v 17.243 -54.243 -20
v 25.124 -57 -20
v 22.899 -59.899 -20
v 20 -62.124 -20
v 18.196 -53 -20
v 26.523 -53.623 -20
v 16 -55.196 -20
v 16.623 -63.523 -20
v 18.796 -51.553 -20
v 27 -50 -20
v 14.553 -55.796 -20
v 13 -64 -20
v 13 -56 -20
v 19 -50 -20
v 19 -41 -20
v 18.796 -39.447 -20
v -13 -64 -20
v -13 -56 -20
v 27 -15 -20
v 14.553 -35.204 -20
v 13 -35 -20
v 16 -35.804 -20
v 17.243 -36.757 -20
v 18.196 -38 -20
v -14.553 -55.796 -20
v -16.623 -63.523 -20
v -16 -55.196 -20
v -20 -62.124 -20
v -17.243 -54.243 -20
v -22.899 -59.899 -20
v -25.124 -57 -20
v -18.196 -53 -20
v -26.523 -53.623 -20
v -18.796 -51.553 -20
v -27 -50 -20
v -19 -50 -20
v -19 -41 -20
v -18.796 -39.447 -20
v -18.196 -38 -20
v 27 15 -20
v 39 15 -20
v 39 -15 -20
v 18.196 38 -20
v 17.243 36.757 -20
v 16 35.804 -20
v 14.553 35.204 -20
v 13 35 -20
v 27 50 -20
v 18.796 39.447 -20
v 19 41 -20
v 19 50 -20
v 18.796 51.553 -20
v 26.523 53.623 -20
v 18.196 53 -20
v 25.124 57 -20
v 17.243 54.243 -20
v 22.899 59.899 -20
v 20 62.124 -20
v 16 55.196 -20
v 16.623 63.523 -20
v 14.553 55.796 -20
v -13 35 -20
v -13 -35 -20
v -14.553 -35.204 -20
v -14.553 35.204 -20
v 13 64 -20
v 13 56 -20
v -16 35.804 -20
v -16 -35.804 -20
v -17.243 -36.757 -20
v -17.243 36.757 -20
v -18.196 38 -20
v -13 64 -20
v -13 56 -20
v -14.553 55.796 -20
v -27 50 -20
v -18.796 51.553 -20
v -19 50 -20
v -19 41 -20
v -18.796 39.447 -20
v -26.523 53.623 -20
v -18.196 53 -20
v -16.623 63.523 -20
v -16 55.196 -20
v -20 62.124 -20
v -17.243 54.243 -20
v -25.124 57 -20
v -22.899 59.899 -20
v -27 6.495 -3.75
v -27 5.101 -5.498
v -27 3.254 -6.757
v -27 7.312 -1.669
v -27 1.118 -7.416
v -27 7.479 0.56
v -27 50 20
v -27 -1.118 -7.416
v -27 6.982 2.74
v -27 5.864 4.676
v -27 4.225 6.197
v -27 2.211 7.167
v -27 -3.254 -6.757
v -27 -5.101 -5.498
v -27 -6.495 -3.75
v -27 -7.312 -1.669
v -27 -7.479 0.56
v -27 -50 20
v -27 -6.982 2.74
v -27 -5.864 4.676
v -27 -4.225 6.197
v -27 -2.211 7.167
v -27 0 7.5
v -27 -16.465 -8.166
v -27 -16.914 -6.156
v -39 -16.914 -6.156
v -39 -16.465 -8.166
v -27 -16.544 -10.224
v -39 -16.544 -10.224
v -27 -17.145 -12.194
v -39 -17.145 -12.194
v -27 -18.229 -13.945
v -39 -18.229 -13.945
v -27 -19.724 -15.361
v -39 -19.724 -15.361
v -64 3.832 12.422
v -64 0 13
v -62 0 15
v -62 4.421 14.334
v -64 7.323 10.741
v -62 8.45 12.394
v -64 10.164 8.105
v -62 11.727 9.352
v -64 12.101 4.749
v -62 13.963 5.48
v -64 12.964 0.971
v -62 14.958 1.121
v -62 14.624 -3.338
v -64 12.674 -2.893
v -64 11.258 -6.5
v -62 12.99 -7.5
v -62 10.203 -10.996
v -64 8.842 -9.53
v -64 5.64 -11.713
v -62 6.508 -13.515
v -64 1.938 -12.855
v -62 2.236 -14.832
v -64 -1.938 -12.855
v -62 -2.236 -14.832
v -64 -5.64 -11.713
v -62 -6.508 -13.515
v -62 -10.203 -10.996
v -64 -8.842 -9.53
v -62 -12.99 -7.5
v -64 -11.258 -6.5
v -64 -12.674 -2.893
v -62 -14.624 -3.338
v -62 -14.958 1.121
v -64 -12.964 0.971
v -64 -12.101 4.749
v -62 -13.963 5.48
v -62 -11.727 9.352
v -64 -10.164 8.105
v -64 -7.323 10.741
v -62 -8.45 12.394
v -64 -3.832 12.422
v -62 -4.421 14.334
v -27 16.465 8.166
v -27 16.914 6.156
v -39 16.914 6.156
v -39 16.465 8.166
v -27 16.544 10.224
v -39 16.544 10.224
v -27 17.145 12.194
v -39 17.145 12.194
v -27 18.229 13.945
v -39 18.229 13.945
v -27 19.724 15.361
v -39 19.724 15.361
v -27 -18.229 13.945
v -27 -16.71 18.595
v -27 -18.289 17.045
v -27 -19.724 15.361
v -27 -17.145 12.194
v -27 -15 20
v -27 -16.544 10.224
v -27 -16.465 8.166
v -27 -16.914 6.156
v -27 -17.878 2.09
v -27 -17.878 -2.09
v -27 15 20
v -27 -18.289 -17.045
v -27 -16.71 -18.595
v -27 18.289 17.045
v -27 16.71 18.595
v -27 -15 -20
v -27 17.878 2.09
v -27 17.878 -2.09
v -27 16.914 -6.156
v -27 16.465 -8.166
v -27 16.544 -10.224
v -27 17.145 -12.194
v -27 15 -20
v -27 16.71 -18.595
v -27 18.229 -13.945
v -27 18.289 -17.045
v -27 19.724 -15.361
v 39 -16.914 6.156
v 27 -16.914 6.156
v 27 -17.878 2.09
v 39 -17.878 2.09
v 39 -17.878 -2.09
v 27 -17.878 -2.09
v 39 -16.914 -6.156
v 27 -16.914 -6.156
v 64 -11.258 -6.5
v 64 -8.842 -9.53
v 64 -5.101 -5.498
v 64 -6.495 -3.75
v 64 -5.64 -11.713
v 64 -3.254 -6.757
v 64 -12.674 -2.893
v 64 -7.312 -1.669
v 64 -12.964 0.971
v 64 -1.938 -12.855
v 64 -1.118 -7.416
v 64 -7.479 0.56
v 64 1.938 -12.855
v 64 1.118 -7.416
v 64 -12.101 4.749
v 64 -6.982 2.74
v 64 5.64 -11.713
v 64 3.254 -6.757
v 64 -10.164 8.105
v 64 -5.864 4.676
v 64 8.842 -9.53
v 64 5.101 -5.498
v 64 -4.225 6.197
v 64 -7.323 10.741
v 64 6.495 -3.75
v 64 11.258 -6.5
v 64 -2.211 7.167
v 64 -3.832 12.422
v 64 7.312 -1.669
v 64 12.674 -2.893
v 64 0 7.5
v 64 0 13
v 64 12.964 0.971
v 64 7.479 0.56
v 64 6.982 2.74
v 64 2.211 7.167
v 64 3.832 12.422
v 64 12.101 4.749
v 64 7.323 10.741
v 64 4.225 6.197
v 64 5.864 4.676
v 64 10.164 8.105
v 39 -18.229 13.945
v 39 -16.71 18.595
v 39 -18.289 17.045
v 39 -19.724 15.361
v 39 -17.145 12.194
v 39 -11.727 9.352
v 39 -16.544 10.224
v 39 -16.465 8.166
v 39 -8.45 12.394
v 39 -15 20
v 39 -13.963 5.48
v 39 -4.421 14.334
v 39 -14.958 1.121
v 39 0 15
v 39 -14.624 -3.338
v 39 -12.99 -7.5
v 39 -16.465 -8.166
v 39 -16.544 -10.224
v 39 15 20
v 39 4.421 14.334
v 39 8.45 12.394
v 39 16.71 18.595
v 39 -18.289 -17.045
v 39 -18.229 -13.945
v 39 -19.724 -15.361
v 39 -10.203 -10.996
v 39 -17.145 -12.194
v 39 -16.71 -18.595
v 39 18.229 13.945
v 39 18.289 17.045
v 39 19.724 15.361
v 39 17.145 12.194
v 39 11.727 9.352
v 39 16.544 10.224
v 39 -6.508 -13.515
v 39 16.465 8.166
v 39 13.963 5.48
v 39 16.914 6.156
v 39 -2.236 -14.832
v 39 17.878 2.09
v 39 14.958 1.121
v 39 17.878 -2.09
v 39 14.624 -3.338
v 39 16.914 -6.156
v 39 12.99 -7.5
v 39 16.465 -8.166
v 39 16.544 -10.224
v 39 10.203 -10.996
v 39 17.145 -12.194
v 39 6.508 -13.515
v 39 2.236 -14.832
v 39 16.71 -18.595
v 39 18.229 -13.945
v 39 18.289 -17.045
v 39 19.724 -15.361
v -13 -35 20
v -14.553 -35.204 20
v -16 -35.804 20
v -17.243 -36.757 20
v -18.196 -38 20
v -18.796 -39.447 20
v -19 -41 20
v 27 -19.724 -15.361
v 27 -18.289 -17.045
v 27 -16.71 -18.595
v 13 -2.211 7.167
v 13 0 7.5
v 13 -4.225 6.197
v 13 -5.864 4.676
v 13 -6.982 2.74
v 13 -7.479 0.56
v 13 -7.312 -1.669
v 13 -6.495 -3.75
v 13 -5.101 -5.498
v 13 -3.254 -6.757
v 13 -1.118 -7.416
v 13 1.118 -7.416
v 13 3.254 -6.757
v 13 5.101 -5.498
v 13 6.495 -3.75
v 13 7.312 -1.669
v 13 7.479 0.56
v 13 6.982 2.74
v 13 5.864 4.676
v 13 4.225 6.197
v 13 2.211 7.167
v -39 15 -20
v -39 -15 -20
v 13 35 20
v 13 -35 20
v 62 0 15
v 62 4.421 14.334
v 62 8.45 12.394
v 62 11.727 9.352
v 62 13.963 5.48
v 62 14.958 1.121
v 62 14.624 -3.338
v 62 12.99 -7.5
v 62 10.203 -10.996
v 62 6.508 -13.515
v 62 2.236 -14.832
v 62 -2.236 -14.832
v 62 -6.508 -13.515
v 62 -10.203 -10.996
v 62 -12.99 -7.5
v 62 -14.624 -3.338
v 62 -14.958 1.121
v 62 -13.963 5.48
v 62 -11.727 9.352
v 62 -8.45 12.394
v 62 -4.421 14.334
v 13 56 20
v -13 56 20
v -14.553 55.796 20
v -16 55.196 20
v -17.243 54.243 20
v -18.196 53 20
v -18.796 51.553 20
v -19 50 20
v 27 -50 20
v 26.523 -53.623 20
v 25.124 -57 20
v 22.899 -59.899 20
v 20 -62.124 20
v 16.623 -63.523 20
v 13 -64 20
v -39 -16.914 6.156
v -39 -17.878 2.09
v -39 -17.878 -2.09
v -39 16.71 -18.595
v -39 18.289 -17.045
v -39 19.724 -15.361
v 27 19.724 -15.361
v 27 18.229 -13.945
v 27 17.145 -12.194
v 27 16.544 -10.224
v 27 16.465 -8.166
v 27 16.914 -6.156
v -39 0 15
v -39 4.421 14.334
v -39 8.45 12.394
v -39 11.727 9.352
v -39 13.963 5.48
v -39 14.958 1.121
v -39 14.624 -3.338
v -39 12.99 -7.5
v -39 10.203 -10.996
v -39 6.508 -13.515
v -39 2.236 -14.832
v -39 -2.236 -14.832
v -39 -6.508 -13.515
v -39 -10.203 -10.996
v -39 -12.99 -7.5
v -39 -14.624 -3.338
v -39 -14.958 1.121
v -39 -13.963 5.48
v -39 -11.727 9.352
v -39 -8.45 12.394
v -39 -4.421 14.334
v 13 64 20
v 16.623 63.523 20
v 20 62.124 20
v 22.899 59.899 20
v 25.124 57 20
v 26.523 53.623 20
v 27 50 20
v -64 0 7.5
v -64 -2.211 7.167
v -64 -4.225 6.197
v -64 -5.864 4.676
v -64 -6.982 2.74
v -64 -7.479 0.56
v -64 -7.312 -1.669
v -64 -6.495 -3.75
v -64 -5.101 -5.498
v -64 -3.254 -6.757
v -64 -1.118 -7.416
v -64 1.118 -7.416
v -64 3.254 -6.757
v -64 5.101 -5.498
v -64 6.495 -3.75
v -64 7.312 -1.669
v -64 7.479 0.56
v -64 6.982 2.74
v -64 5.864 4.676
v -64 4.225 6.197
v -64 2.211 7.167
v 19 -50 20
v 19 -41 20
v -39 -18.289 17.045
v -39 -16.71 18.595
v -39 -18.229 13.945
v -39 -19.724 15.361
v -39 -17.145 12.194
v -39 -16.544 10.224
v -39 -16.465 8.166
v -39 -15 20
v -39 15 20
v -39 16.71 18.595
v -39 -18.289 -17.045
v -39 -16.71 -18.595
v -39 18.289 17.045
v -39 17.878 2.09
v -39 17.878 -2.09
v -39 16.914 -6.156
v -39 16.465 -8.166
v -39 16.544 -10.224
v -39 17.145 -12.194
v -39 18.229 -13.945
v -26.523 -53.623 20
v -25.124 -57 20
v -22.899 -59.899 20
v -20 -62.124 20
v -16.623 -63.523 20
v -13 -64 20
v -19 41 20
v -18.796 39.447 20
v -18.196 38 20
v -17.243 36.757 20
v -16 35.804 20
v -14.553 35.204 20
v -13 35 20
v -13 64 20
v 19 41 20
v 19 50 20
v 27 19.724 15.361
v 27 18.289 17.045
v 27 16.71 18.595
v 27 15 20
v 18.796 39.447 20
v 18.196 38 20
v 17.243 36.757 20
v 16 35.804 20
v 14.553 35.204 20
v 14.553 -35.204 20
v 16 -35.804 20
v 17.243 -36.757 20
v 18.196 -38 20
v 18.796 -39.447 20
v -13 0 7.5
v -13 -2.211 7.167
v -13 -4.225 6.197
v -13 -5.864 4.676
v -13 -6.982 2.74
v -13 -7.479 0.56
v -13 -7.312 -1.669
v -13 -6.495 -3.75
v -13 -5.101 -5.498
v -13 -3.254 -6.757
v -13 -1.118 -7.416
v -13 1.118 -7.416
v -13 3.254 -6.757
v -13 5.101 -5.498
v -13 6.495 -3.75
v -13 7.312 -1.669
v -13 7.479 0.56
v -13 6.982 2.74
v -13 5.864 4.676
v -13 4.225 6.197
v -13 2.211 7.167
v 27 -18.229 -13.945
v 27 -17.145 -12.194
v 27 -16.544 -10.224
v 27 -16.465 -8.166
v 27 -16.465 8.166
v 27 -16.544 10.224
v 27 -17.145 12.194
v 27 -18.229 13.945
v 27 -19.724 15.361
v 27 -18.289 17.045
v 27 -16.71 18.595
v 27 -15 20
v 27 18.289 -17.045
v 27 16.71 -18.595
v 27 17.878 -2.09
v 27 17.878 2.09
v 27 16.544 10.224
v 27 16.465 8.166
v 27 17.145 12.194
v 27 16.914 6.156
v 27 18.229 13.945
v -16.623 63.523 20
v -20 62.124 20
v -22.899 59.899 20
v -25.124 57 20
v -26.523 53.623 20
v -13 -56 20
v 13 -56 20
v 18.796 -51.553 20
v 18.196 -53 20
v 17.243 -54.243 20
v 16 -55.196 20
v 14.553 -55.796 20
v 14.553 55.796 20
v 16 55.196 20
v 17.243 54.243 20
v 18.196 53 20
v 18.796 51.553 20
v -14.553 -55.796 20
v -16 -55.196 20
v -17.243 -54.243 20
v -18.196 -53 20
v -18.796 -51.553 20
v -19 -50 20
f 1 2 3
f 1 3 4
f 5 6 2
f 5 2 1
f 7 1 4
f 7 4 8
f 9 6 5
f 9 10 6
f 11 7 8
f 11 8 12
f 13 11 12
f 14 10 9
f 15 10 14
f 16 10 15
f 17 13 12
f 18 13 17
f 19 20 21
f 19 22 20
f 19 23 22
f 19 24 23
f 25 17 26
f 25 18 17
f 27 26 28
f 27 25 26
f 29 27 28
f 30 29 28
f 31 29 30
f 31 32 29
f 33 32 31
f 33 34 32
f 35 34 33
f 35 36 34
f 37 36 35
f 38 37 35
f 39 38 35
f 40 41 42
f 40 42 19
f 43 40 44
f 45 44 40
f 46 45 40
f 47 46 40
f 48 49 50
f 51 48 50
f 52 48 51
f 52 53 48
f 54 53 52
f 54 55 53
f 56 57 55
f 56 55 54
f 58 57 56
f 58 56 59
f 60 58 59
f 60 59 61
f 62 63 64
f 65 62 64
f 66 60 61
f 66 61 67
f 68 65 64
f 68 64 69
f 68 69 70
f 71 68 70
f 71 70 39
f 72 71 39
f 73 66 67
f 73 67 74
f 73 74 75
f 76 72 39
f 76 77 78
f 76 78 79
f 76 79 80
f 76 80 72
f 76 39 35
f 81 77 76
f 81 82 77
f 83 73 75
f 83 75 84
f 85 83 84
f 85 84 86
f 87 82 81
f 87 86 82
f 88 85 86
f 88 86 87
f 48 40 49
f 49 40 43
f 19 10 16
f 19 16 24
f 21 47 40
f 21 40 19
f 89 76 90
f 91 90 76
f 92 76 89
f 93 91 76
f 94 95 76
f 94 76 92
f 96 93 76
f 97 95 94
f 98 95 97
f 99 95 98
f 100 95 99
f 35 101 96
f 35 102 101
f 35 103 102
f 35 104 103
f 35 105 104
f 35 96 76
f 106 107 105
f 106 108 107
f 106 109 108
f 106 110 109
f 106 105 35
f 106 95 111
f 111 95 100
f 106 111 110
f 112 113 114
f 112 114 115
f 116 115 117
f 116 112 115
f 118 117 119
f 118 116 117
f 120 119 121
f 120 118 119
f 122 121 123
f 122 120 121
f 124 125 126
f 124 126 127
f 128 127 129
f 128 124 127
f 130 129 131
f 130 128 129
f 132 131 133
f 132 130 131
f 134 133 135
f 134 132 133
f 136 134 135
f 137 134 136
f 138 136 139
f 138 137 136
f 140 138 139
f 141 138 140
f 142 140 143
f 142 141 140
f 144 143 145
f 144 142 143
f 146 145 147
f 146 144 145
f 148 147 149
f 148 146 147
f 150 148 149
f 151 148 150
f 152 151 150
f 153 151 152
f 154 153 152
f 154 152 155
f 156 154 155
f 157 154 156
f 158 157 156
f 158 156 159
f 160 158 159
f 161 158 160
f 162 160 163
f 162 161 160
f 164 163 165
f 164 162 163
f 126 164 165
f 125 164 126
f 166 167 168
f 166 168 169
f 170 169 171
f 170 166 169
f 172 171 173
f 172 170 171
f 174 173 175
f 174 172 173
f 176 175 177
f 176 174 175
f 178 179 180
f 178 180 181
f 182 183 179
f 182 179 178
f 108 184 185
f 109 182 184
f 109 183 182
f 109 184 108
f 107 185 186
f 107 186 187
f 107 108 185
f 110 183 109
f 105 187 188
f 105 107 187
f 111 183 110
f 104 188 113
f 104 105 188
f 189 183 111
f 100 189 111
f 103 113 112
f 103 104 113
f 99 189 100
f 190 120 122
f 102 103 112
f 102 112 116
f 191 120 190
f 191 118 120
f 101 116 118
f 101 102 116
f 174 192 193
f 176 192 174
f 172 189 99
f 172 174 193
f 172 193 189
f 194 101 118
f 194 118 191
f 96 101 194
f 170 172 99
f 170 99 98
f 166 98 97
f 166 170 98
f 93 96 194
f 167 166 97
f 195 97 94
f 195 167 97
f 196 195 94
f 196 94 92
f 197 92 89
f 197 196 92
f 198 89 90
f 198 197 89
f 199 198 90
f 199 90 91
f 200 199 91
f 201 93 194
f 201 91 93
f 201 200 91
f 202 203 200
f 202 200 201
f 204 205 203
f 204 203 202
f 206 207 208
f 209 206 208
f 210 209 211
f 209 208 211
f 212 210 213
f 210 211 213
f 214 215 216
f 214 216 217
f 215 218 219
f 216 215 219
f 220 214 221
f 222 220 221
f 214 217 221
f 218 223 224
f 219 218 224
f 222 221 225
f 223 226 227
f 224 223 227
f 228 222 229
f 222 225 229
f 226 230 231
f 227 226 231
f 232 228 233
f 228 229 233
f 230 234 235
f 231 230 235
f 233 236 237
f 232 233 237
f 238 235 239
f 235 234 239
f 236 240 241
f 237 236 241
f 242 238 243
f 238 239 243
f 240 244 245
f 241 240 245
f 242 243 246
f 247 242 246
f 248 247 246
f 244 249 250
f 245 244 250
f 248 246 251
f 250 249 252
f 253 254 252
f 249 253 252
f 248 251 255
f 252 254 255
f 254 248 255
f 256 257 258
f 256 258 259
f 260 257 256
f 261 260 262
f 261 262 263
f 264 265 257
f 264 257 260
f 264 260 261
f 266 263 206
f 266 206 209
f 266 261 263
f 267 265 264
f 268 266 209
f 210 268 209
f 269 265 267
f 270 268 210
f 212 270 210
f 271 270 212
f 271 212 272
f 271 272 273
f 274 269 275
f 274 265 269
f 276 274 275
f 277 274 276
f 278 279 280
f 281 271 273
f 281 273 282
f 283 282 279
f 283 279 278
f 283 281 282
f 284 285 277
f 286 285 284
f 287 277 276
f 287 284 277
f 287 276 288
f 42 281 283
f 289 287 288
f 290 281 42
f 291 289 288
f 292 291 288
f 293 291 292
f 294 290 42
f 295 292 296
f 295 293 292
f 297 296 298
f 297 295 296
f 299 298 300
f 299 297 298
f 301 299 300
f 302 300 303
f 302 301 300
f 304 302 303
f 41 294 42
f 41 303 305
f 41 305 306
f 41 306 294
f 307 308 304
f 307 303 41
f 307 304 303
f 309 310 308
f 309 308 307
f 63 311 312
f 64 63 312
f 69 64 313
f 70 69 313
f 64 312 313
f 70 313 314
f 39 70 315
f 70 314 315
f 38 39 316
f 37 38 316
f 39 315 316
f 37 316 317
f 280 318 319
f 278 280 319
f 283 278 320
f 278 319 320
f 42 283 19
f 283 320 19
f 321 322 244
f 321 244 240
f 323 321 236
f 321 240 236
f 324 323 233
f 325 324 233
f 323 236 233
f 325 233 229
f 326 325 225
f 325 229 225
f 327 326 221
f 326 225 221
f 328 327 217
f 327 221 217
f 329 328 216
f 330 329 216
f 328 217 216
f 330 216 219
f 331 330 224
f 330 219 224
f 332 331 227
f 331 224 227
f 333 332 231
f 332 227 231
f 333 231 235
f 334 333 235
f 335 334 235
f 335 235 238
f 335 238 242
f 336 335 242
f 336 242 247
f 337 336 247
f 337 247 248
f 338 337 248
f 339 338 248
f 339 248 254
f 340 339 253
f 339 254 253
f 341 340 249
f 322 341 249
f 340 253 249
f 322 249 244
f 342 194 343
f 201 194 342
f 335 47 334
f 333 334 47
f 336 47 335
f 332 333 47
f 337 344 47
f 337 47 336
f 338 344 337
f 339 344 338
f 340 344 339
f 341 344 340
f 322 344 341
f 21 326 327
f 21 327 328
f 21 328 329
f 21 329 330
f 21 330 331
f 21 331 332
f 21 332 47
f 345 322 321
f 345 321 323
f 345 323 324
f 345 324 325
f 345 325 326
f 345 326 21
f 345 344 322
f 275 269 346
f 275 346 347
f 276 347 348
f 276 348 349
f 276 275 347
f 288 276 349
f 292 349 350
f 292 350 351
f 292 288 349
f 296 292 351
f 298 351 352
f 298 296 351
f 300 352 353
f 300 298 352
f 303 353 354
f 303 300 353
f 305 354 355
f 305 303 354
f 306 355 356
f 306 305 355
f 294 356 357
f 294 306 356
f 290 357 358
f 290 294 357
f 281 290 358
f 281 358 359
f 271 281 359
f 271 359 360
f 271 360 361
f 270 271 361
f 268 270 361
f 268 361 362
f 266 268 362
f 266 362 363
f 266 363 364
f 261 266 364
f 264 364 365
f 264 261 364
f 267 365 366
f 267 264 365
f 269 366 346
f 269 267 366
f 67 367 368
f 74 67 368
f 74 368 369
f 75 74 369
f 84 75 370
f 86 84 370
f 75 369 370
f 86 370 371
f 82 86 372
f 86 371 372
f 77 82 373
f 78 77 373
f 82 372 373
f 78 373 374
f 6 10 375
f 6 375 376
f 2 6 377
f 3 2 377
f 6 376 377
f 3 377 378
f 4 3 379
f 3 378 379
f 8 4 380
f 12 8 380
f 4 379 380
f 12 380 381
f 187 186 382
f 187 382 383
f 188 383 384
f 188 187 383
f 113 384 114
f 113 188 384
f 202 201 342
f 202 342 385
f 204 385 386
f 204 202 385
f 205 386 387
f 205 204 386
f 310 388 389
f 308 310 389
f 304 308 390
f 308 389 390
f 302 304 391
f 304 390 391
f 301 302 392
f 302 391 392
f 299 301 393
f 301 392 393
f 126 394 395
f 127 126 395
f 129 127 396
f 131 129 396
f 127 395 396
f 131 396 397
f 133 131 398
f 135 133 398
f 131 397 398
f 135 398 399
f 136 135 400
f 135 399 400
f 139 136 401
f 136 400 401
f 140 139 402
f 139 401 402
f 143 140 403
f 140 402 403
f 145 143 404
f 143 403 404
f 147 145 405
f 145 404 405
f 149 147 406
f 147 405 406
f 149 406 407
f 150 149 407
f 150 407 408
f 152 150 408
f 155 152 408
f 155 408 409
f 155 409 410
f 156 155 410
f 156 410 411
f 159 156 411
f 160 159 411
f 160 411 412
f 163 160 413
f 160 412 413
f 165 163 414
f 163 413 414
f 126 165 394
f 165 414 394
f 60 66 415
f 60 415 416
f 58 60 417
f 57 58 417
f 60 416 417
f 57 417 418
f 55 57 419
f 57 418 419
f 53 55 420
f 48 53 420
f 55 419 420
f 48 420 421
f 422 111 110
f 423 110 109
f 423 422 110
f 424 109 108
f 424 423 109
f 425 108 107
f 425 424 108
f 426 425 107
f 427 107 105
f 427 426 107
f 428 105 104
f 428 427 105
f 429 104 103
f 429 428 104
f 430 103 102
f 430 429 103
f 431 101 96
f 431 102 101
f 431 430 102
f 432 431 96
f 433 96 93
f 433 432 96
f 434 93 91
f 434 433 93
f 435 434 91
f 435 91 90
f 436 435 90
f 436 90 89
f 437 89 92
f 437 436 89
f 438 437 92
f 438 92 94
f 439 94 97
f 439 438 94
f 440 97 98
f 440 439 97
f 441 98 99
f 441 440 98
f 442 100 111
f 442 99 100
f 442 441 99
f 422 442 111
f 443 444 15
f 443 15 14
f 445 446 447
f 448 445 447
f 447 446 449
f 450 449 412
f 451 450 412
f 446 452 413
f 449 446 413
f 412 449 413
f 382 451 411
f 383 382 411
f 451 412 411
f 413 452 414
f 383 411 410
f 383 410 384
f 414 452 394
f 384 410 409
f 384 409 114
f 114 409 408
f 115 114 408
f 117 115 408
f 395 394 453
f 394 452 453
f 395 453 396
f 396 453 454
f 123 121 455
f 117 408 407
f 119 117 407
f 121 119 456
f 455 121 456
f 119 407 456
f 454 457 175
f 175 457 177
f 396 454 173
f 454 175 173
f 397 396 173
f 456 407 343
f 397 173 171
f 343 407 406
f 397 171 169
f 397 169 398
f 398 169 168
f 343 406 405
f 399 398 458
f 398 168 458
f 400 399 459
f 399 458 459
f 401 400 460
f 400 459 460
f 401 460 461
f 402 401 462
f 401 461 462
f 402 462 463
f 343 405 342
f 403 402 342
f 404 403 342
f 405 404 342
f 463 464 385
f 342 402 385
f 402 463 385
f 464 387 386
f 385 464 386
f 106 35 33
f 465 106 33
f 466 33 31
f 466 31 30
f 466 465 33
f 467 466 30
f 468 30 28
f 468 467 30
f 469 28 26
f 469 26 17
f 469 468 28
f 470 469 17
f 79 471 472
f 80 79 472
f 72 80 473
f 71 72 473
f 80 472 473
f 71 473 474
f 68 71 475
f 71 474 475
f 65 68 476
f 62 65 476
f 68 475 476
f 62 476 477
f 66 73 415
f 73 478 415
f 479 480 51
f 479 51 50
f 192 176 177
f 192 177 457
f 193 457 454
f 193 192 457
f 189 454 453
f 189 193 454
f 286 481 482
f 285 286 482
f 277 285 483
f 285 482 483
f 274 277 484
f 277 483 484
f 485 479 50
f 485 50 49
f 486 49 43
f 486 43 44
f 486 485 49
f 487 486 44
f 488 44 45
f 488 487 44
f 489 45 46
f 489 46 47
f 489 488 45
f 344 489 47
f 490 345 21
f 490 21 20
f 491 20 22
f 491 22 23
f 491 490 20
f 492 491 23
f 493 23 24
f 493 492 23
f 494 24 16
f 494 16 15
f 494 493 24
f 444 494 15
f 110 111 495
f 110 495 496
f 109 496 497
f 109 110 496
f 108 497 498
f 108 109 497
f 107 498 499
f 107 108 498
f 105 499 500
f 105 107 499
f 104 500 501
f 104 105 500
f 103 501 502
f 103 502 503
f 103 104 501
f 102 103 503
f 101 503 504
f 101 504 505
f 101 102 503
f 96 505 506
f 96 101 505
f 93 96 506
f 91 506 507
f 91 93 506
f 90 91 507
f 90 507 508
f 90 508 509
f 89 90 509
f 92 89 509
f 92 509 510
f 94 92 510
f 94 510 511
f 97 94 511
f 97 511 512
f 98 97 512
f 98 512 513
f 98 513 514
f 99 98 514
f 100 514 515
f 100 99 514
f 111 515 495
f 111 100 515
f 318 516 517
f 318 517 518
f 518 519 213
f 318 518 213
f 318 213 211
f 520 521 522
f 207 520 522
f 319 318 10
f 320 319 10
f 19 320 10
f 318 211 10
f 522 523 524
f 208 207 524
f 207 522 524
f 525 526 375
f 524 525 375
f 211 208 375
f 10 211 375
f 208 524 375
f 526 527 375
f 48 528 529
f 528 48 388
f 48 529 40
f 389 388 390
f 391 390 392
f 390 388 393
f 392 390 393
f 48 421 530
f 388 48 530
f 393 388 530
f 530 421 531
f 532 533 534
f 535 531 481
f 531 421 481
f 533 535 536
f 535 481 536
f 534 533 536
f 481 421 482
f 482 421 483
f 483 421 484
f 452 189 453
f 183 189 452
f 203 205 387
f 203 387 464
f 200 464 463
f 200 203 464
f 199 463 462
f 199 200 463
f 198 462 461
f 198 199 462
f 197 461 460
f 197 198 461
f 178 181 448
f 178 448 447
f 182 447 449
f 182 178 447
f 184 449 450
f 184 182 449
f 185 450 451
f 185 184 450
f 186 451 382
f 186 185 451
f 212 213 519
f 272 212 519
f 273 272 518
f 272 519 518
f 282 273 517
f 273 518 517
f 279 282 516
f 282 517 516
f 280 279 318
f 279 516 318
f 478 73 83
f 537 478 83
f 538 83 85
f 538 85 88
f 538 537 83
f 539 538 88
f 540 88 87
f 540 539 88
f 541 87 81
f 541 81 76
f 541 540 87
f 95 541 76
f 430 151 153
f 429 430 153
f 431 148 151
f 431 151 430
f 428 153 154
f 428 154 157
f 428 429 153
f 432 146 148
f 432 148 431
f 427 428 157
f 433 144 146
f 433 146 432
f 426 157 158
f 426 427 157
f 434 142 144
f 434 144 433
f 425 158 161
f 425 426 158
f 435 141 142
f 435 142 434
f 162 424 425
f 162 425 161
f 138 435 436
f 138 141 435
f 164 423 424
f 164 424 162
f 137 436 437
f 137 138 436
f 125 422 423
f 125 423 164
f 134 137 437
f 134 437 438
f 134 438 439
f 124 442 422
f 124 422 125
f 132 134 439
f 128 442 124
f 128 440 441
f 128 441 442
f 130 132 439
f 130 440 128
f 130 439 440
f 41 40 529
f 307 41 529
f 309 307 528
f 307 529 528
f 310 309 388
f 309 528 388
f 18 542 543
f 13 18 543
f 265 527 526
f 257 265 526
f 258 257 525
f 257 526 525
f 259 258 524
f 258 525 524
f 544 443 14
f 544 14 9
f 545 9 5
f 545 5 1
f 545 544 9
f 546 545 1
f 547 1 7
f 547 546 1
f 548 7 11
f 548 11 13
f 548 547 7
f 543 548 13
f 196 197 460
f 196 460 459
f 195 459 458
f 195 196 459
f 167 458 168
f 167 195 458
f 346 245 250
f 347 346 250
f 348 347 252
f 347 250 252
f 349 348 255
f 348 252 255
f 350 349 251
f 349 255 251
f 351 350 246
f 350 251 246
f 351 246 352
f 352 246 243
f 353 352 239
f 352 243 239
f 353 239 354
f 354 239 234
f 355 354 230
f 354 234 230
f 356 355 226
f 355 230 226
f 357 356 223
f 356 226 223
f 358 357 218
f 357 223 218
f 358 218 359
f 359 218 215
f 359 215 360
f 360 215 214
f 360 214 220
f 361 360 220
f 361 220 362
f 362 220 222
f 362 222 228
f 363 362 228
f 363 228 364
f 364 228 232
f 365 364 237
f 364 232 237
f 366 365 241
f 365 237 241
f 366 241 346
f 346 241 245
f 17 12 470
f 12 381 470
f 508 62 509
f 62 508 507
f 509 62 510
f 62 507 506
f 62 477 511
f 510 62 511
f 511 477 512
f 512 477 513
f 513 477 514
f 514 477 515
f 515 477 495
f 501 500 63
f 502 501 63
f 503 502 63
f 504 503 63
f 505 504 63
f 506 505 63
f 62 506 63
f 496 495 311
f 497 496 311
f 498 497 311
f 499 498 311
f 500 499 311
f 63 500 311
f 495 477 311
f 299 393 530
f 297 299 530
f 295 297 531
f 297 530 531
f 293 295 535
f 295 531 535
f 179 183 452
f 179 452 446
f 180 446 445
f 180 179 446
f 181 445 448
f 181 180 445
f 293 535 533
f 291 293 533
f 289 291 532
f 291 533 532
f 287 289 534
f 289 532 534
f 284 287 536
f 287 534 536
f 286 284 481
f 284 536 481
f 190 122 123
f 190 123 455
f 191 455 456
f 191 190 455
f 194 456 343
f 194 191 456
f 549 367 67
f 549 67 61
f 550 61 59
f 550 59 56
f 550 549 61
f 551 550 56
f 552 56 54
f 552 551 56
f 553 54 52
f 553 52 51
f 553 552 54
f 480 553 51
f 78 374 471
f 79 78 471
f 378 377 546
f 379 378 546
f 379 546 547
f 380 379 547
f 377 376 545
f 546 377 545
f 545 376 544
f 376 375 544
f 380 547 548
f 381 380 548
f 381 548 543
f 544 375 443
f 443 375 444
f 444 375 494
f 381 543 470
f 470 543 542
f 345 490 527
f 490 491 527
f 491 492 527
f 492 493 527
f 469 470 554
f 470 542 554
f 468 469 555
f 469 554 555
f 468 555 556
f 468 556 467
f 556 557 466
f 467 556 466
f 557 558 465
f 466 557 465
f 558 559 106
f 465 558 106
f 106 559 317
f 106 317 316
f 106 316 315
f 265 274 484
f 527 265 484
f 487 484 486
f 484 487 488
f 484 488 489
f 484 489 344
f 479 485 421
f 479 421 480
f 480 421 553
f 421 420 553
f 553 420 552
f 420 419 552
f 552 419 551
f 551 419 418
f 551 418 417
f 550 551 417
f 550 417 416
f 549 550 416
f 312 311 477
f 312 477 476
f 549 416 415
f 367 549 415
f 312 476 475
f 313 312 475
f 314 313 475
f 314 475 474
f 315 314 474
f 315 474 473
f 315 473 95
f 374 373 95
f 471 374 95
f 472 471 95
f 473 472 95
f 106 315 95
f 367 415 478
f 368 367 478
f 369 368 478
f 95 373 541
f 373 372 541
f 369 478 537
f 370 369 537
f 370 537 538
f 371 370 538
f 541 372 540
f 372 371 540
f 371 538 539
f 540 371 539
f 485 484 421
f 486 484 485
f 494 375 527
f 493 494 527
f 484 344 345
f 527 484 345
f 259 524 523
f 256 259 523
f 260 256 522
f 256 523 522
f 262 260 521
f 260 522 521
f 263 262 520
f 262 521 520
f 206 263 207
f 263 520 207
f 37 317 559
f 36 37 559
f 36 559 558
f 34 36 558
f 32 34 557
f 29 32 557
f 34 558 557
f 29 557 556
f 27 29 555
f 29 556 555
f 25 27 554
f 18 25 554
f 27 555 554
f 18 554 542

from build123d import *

# Parameters (mm, degrees)
BOSS_EXTRUDE1_DEPTH      = 20
CUT_EXTRUDE1_DEPTH       = 40
BOSS_EXTRUDE2_DEPTH      = 12
SKETCH5_R                = 15
BOSS_EXTRUDE3_DEPTH      = 25
CHAMFER1_SIZE            = 2
CHAMFER1_OF_MIRROR2_SIZE = 2


with BuildPart() as part:
    # Sketch1 → Boss-Extrude1 (new, symmetric)
    with BuildSketch(Plane.XY):
        with BuildLine():
            Line((0, 64), (-13, 64))
            ThreePointArc((-13, 64), (-22.899494937, 59.899494937), (-27, 50))
            Line((-27, 50), (-27, -50))
            ThreePointArc((-27, -50), (-22.899494937, -59.899494937), (-13, -64))
            Line((-13, -64), (0, -64))
            Line((0, -64), (0, 64))
        make_face()
    boss_extrude1 = extrude(amount=BOSS_EXTRUDE1_DEPTH, both=True)

    # Sketch2 → Cut-Extrude1 (cut)
    with BuildSketch(Plane.XY.offset(20)):
        with BuildLine():
            Line((-13, 35), (-13, -35))
            ThreePointArc((-13, -35), (-17.242640687, -36.757359313), (-19, -41))
            Line((-19, -41), (-19, -50))
            ThreePointArc((-19, -50), (-17.242640687, -54.242640687), (-13, -56))
            Line((-13, -56), (0, -56))
            Line((0, -56), (0, 56))
            Line((0, 56), (-13, 56))
            ThreePointArc((-13, 56), (-17.242640687, 54.242640687), (-19, 50))
            Line((-19, 50), (-19, 41))
            ThreePointArc((-19, 41), (-17.242640687, 36.757359313), (-13, 35))
        make_face()
    cut_extrude1 = extrude(amount=-CUT_EXTRUDE1_DEPTH, mode=Mode.SUBTRACT)

    # Mirror1: Boss-Extrude1, Cut-Extrude1 across plane
    add(boss_extrude1.mirror(Plane(origin=(0, 0, 0), x_dir=(0, 0, 1), z_dir=(1, 0, 0))))
    add(cut_extrude1.mirror(Plane(origin=(0, 0, 0), x_dir=(0, 0, 1), z_dir=(1, 0, 0))), mode=Mode.SUBTRACT)


with BuildPart() as body_2:
    # Sketch4 → Boss-Extrude2 (new body)
    with BuildSketch(Plane.ZY.offset(27)):
        with BuildLine():
            Line((20, 15), (20, -15))
            ThreePointArc((20, -15), (17.837457423, -17.516424084), (15.36071929, -19.724307412))
            ThreePointArc((15.36071929, -19.724307412), (11.22829357, -16.780591328), (6.15636258, -16.914467174))
            ThreePointArc((6.15636258, -16.914467174), (0, -18), (-6.15636258, -16.914467174))
            ThreePointArc((-6.15636258, -16.914467174), (-11.22829357, -16.780591328), (-15.36071929, -19.724307412))
            ThreePointArc((-15.36071929, -19.724307412), (-17.837457423, -17.516424084), (-20, -15))
            Line((-20, -15), (-20, 15))
            ThreePointArc((-20, 15), (-17.837457423, 17.516424084), (-15.36071929, 19.724307412))
            ThreePointArc((-15.36071929, 19.724307412), (-11.22829357, 16.780591328), (-6.15636258, 16.914467174))
            ThreePointArc((-6.15636258, 16.914467174), (0, 18), (6.15636258, 16.914467174))
            ThreePointArc((6.15636258, 16.914467174), (11.22829357, 16.780591328), (15.36071929, 19.724307412))
            ThreePointArc((15.36071929, 19.724307412), (17.837457423, 17.516424084), (20, 15))
        make_face()
    boss_extrude2 = extrude(amount=BOSS_EXTRUDE2_DEPTH)

    # Sketch5 → Boss-Extrude3 (add)
    with BuildSketch(Plane.ZY.offset(39)):
        Circle(SKETCH5_R)
    boss_extrude3 = extrude(amount=BOSS_EXTRUDE3_DEPTH)


with BuildPart() as f_15_0_15_diameter_hole1_tool:
    # Sketch7 → Ø15.0 (15) Diameter Hole1 (revolve)
    with BuildSketch(Plane(origin=(-64, 0, 0), x_dir=(0, 0, 1), z_dir=(0, 1, 0))):
        Polygon((0, 0), (0, 55.506454643), (7.5, 51), (7.5, 0), align=None)
    f_15_0_15_diameter_hole1 = revolve(axis=Axis((-70.35, 0, 0), (1, 0, 0)))


with BuildPart() as part_1:
    add(part.part)

    # Ø15.0 (15) Diameter Hole1: cut by f_15_0_15_diameter_hole1_tool
    add(f_15_0_15_diameter_hole1_tool.part, mode=Mode.SUBTRACT)

    # Mirror2: Boss-Extrude2, Boss-Extrude3, Ø15.0 (15) Diameter Hole1 across plane
    add(boss_extrude2.mirror(Plane(origin=(0, 0, 0), x_dir=(0, 0, 1), z_dir=(1, 0, 0))))
    add(boss_extrude3.mirror(Plane(origin=(0, 0, 0), x_dir=(0, 0, 1), z_dir=(1, 0, 0))))
    add(f_15_0_15_diameter_hole1.mirror(Plane(origin=(0, 0, 0), x_dir=(0, 0, 1), z_dir=(1, 0, 0))), mode=Mode.SUBTRACT)

    # Chamfer1 of Mirror2
    chamfer1_of_mirror2_edges = [part_1.edges().sort_by_distance(p)[0] for p in [
        (64, 0, -15),
    ]]
    chamfer(chamfer1_of_mirror2_edges, length=CHAMFER1_OF_MIRROR2_SIZE)


with BuildPart() as body_2_1:
    add(body_2.part)

    # Ø15.0 (15) Diameter Hole1: cut by f_15_0_15_diameter_hole1_tool
    add(f_15_0_15_diameter_hole1_tool.part, mode=Mode.SUBTRACT)

    # Chamfer1
    chamfer1_edges = [body_2_1.edges().sort_by_distance(p)[0] for p in [
        (-64, 0, -15),
    ]]
    chamfer(chamfer1_edges, length=CHAMFER1_SIZE)


solid = Compound([part_1.part, body_2_1.part])
